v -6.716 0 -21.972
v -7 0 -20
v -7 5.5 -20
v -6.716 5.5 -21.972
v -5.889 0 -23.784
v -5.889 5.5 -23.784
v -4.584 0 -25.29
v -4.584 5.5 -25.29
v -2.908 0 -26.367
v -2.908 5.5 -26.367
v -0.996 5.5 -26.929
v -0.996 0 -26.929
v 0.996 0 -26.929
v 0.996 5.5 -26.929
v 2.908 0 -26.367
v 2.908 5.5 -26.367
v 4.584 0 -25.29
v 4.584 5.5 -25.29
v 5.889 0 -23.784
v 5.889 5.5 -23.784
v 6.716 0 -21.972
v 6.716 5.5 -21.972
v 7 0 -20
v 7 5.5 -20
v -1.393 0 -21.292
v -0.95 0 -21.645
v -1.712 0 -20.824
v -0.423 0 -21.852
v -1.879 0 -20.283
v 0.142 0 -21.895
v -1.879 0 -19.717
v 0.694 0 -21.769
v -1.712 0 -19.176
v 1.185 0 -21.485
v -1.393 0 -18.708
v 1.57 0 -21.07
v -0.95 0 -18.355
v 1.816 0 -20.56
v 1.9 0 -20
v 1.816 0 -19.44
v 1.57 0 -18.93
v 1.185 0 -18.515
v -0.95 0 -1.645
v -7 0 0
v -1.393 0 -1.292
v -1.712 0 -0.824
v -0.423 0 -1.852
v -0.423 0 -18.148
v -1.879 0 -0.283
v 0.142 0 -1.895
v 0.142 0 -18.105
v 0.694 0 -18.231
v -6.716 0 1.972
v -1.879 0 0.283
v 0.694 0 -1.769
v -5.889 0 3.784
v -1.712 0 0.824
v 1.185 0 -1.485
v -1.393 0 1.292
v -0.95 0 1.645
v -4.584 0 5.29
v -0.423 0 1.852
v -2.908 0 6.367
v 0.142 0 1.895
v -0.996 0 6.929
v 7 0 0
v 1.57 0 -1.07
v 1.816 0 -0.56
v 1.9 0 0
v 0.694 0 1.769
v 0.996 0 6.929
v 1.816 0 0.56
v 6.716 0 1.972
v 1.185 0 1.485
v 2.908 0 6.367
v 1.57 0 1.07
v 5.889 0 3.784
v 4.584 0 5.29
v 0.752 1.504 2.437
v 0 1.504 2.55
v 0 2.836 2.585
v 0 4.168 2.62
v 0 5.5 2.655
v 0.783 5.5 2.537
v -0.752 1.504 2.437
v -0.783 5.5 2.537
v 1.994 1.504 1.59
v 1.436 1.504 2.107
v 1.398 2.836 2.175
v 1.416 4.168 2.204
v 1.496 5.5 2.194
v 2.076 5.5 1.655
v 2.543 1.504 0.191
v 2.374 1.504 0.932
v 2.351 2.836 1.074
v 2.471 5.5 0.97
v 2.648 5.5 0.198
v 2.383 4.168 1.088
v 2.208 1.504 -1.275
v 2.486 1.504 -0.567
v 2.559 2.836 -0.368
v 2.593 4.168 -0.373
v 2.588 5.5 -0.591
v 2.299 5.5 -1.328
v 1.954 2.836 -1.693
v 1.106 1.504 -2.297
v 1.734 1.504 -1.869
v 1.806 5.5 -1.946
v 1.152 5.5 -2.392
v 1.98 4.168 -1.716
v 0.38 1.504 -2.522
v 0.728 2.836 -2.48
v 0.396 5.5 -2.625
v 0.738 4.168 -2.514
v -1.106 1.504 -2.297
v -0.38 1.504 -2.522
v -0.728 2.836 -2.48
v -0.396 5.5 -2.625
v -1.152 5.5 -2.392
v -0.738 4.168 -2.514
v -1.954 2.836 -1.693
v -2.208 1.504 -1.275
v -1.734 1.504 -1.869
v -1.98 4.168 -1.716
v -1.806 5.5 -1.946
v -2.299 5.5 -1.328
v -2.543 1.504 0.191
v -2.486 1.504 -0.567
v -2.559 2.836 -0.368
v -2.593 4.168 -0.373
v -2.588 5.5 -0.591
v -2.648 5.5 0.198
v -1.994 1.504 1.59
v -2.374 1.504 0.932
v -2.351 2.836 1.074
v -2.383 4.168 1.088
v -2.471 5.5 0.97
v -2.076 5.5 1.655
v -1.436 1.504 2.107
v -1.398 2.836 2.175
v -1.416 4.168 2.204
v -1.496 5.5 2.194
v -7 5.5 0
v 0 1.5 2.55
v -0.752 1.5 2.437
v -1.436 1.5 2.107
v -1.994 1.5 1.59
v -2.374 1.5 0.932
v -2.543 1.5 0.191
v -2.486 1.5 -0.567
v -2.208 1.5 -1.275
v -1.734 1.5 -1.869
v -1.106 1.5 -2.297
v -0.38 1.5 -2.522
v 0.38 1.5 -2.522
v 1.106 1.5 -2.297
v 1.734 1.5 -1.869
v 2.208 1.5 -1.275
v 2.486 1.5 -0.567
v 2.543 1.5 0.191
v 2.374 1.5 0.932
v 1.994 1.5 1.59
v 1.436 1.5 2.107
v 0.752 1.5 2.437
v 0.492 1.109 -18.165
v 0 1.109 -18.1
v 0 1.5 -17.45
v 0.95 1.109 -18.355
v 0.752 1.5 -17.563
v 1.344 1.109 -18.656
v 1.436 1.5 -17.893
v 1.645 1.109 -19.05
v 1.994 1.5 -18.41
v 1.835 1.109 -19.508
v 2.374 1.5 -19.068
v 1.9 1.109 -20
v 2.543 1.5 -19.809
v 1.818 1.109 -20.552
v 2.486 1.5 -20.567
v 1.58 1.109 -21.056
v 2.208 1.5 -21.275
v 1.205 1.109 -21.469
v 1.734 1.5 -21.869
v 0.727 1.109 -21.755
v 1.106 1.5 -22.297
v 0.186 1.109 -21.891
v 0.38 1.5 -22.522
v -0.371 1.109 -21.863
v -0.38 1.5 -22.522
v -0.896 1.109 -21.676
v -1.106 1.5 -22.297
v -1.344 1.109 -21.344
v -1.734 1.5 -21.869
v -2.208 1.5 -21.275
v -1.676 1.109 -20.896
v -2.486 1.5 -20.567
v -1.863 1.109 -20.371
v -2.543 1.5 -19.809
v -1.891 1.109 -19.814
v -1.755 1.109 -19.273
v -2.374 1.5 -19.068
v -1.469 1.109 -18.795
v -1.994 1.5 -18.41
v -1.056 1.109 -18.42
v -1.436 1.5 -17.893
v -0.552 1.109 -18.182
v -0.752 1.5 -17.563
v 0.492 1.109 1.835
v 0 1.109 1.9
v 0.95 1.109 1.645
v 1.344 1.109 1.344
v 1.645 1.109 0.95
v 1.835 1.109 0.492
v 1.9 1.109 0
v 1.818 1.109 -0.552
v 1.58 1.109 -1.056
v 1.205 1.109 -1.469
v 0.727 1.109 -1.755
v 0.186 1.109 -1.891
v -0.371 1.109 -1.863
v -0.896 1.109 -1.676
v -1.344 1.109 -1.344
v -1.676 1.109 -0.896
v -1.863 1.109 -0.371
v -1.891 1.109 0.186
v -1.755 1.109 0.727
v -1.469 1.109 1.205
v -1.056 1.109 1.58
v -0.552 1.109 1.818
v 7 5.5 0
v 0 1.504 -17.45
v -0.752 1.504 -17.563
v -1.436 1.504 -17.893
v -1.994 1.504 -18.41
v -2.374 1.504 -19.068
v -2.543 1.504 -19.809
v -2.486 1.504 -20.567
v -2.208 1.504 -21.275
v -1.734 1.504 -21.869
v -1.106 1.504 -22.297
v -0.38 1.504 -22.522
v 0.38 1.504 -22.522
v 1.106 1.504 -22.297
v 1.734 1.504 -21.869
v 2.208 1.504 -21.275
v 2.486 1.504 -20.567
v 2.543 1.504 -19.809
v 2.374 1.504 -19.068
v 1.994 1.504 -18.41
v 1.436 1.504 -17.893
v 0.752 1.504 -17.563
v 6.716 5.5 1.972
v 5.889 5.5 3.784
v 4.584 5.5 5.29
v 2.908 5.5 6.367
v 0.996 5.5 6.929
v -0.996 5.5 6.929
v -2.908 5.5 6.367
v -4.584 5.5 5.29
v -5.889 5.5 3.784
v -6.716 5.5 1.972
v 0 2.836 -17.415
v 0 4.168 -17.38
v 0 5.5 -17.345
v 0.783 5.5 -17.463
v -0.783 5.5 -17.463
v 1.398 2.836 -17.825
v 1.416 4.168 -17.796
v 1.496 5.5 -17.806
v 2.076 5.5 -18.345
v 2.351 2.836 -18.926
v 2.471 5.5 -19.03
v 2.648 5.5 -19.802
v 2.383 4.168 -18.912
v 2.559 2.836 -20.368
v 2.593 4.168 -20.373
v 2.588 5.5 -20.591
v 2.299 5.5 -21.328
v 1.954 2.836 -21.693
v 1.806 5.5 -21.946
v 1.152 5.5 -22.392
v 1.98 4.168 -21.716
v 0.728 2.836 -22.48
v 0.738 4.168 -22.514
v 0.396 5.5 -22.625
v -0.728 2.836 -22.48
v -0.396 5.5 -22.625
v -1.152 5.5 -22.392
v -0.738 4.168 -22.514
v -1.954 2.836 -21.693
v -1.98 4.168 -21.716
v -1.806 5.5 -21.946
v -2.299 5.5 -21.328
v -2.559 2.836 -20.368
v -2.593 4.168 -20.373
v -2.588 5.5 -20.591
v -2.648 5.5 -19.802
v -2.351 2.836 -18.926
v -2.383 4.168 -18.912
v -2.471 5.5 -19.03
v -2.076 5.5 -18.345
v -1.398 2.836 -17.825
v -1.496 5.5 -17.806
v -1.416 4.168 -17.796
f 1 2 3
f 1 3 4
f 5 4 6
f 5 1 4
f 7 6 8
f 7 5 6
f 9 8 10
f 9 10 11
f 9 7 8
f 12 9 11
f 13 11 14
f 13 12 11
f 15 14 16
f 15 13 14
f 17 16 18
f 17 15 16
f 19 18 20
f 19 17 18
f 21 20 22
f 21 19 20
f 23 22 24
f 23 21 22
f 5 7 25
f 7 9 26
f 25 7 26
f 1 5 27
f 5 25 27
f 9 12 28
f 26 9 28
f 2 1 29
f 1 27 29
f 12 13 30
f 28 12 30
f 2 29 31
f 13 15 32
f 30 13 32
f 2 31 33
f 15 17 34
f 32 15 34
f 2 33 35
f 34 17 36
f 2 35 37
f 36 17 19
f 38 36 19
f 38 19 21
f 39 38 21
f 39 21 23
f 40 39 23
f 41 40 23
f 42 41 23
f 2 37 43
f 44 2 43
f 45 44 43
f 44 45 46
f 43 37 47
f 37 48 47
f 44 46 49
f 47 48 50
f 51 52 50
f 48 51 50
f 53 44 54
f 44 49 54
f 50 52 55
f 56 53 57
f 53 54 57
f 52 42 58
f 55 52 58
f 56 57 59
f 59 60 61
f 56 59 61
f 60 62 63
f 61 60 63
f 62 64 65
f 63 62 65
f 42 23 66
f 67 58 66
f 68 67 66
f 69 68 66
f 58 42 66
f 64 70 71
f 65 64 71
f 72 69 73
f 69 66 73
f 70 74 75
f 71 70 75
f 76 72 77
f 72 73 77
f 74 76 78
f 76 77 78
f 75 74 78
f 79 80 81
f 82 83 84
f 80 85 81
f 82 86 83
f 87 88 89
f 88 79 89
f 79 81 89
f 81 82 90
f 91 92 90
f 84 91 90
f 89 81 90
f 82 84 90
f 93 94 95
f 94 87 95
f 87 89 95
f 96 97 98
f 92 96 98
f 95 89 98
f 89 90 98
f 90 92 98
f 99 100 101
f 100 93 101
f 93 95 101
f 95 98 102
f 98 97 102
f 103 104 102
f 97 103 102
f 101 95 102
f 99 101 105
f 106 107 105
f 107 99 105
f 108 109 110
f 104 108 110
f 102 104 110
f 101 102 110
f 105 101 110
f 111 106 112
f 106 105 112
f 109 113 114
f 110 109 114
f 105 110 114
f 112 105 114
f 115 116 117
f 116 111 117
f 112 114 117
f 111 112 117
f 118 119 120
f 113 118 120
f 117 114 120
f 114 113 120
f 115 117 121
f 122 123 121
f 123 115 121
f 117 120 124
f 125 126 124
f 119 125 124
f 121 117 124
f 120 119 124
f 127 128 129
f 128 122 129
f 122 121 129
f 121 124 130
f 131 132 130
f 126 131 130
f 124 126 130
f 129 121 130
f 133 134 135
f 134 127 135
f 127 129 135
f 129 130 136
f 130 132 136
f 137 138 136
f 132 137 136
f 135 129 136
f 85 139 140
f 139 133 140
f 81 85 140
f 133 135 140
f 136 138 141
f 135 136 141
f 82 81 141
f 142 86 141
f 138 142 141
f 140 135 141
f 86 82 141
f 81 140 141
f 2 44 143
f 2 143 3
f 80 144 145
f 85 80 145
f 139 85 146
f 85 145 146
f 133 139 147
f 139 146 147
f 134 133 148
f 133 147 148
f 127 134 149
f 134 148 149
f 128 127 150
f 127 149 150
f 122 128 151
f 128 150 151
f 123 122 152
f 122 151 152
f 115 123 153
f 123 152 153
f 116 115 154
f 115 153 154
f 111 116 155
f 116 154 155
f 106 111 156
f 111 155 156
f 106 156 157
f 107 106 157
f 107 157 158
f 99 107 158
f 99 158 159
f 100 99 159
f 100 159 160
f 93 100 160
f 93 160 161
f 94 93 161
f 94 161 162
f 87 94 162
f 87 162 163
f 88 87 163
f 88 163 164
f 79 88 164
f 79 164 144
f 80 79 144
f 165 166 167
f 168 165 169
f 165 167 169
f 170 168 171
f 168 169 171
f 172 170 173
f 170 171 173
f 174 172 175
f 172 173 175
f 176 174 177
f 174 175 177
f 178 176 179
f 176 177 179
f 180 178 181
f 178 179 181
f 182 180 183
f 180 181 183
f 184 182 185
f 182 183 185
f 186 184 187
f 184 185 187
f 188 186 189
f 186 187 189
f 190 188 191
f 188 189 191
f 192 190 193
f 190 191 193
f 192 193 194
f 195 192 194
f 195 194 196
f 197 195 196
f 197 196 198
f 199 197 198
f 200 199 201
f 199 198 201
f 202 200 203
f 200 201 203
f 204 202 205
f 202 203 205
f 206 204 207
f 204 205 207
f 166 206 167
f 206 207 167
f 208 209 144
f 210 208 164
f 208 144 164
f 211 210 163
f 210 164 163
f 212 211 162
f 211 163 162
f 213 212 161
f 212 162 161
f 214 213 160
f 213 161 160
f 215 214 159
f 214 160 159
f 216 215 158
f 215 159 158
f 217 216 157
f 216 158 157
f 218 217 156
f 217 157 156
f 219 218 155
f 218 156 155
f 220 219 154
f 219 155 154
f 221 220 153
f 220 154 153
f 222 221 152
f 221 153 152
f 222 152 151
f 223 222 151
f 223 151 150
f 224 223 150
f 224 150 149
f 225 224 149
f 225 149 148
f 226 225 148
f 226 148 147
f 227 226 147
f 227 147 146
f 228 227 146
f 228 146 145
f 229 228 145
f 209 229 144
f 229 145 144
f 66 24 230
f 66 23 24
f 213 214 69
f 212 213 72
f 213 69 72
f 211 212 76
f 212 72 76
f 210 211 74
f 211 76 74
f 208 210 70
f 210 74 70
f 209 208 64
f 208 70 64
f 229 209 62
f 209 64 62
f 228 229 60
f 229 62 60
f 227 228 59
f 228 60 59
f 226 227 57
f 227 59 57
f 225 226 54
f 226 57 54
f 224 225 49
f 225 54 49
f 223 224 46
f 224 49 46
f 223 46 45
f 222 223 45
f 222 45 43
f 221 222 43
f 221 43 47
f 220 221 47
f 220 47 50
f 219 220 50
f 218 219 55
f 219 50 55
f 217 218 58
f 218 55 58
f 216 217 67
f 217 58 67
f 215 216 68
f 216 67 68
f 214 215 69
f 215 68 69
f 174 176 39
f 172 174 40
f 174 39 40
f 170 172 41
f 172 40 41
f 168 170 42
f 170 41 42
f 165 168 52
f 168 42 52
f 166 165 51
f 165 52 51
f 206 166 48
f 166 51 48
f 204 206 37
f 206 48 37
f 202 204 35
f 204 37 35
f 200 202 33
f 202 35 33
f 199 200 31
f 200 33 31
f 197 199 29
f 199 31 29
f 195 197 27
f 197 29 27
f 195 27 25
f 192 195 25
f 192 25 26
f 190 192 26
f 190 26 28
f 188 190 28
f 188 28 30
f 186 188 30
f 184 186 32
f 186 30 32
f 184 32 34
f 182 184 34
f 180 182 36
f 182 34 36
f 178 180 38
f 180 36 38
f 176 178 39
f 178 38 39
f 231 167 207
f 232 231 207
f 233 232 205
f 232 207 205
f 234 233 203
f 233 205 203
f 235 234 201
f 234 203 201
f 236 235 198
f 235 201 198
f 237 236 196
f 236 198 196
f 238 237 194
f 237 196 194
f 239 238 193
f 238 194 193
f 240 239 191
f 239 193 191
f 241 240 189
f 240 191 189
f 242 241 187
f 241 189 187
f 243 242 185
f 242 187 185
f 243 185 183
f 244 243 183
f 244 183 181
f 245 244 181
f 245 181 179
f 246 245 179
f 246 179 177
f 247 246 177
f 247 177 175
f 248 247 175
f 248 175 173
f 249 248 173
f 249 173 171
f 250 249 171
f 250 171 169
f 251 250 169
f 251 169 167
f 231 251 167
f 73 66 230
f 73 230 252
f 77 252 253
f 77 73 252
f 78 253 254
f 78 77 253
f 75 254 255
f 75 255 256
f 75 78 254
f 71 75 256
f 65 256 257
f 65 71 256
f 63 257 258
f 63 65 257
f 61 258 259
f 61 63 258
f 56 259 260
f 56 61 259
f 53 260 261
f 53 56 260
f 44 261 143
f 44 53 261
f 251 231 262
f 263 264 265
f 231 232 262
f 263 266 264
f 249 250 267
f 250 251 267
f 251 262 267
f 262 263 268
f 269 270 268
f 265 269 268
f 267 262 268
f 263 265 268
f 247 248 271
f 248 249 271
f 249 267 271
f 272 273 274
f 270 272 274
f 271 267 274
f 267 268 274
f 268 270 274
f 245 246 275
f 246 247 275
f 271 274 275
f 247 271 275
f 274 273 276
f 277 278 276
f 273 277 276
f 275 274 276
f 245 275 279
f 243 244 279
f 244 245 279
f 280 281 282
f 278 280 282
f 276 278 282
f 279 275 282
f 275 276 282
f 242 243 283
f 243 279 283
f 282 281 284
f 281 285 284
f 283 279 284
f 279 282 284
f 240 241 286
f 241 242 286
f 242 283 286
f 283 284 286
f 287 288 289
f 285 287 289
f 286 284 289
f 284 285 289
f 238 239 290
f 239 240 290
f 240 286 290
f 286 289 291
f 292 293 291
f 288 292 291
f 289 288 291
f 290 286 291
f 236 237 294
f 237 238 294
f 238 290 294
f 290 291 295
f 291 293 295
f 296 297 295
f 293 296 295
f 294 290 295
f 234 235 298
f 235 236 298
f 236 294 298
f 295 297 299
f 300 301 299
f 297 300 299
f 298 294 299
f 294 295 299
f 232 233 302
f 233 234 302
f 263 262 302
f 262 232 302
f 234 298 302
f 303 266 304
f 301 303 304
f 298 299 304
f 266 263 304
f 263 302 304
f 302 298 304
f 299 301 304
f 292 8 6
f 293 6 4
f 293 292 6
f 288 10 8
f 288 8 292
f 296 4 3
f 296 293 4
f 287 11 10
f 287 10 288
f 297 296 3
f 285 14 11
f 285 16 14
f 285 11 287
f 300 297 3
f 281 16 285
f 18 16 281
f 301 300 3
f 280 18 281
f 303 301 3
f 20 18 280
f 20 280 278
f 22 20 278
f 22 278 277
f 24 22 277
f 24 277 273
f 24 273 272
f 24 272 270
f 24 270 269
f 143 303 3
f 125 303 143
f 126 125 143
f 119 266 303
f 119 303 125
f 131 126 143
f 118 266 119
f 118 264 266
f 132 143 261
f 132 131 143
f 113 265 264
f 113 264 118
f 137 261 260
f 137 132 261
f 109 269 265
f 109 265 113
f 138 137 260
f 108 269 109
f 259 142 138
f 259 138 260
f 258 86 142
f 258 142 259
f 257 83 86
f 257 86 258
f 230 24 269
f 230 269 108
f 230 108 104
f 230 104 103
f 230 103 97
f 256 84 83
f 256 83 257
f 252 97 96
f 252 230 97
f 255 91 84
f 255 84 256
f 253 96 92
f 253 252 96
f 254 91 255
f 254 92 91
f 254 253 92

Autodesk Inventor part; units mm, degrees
ref_plane "YZ Plane" through (0, 0, 0) normal (1, 0, 0) x (0, 1, 0)
ref_plane "XZ Plane" through (0, 0, 0) normal (0, 1, 0) x (-1, 0, 0)
ref_plane "XY Plane" through (0, 0, 0) normal (0, 0, 1) x (1, 0, 0)
sketch "Sketch1" plane through (0, 0, 0) normal (0, 1, 0) x (-1, 0, 0)
  line L0 (0, 0) -> (0, -20)
  line L1 (0, 0) -> (-4, 0) construction
  line L2 (0, -20) -> (-4, -20) construction
  line L3 (0, 0) -> (-5, 0)
  arc A0 (5, 0) -> (-5, 0) centre (0, 0) ccw
  line L4 (-5, 0) -> (-5, -20)
  arc A1 (-5, -20) -> (5, -20) centre (0, -20) ccw
  line L5 (5, -20) -> (5, 0)
  dimension "d11" = 20
  dimension "d12" = 5
  dimension "d13" = 90
  dimension "d14" = 20
sketch "Sketch1 outline for Extrusion1" plane through (0, 0, 0) normal (0, 1, 0) x (-1, 0, 0)
  arc A0 (-5, 0) -> (5, 0) centre (0, 0) cw
  line L0 (5, 0) -> (5, -20)
  arc A1 (5, -20) -> (-5, -20) centre (0, -20) cw
  line L1 (-5, -20) -> (-5, 0)
extrude "Extrusion1" add sketch "Sketch1 outline for Extrusion1" along normal blind 5.5
sketch "Sketch2" plane through (0, 5.5, 0) normal (0, 1, 0) x (1, 0, 0)
  circle A0 centre (0, 0) radius 2.655
  line L0 (0, 0) -> (0, 20)
  circle A1 centre (0, 20) radius 2.655
  dimension "d7" = 5.31
  dimension "d8" = 20
  dimension "d9" = 5.31
sketch "Sketch3" plane through (0, 0, 0) normal (0, -1, 0) x (1, 0, 0)
  circle A0 centre (0, 0) radius 1.9
  line L0 (0, 0) -> (0, -20)
  circle A1 centre (0, -20) radius 1.9
  dimension "d15" = 3.8
  dimension "d16" = 20
  dimension "d17" = 3.8
sketch "Sketch3 outline for Extrusion2" plane through (0, 0, 0) normal (0, -1, 0) x (1, 0, 0)
  circle A0 centre (0, 0) radius 1.9
  circle A1 centre (0, -20) radius 1.9
extrude "Extrusion2" cut sketch "Sketch3 outline for Extrusion2" against normal blind 1.2
sketch "Sketch4" plane through (0, 1.2, -20) normal (0, -1, 0) x (1, 0, 0)
  circle A0 centre (0, 0) radius 1.9 projected
  circle A1 centre (0, 0) radius 1.9
  circle A2 centre (0, 20) radius 1.9
sketch "Sketch5" plane through (5, 0, 0) normal (1, 0, 0) x (0, 0, -1)
  line L0 (0, 0) -> (0, 5.5) projected
  line L1 (0, 0) -> (0, 5.5)
hole "Hole1" at (0, 5.5, 0) at (0, 5.5, -20) direction (0, -1, 0) diameter 5.1 depth 4 tip angle 118 countersink diameter 5.31 countersink angle 3.01
thicken "Thicken1" operation add thickness 2 both sides no extend neighbours yes toward (0.9967573, 0, -0.0804666) faces at (4.983787, 3.666667, -20.402333) (5, 1.833333, -13.333333) (-5, 1.833333, -6.666667) (-4.983787, 3.666667, 0.402333)
properties part number "Rod_constraint"
